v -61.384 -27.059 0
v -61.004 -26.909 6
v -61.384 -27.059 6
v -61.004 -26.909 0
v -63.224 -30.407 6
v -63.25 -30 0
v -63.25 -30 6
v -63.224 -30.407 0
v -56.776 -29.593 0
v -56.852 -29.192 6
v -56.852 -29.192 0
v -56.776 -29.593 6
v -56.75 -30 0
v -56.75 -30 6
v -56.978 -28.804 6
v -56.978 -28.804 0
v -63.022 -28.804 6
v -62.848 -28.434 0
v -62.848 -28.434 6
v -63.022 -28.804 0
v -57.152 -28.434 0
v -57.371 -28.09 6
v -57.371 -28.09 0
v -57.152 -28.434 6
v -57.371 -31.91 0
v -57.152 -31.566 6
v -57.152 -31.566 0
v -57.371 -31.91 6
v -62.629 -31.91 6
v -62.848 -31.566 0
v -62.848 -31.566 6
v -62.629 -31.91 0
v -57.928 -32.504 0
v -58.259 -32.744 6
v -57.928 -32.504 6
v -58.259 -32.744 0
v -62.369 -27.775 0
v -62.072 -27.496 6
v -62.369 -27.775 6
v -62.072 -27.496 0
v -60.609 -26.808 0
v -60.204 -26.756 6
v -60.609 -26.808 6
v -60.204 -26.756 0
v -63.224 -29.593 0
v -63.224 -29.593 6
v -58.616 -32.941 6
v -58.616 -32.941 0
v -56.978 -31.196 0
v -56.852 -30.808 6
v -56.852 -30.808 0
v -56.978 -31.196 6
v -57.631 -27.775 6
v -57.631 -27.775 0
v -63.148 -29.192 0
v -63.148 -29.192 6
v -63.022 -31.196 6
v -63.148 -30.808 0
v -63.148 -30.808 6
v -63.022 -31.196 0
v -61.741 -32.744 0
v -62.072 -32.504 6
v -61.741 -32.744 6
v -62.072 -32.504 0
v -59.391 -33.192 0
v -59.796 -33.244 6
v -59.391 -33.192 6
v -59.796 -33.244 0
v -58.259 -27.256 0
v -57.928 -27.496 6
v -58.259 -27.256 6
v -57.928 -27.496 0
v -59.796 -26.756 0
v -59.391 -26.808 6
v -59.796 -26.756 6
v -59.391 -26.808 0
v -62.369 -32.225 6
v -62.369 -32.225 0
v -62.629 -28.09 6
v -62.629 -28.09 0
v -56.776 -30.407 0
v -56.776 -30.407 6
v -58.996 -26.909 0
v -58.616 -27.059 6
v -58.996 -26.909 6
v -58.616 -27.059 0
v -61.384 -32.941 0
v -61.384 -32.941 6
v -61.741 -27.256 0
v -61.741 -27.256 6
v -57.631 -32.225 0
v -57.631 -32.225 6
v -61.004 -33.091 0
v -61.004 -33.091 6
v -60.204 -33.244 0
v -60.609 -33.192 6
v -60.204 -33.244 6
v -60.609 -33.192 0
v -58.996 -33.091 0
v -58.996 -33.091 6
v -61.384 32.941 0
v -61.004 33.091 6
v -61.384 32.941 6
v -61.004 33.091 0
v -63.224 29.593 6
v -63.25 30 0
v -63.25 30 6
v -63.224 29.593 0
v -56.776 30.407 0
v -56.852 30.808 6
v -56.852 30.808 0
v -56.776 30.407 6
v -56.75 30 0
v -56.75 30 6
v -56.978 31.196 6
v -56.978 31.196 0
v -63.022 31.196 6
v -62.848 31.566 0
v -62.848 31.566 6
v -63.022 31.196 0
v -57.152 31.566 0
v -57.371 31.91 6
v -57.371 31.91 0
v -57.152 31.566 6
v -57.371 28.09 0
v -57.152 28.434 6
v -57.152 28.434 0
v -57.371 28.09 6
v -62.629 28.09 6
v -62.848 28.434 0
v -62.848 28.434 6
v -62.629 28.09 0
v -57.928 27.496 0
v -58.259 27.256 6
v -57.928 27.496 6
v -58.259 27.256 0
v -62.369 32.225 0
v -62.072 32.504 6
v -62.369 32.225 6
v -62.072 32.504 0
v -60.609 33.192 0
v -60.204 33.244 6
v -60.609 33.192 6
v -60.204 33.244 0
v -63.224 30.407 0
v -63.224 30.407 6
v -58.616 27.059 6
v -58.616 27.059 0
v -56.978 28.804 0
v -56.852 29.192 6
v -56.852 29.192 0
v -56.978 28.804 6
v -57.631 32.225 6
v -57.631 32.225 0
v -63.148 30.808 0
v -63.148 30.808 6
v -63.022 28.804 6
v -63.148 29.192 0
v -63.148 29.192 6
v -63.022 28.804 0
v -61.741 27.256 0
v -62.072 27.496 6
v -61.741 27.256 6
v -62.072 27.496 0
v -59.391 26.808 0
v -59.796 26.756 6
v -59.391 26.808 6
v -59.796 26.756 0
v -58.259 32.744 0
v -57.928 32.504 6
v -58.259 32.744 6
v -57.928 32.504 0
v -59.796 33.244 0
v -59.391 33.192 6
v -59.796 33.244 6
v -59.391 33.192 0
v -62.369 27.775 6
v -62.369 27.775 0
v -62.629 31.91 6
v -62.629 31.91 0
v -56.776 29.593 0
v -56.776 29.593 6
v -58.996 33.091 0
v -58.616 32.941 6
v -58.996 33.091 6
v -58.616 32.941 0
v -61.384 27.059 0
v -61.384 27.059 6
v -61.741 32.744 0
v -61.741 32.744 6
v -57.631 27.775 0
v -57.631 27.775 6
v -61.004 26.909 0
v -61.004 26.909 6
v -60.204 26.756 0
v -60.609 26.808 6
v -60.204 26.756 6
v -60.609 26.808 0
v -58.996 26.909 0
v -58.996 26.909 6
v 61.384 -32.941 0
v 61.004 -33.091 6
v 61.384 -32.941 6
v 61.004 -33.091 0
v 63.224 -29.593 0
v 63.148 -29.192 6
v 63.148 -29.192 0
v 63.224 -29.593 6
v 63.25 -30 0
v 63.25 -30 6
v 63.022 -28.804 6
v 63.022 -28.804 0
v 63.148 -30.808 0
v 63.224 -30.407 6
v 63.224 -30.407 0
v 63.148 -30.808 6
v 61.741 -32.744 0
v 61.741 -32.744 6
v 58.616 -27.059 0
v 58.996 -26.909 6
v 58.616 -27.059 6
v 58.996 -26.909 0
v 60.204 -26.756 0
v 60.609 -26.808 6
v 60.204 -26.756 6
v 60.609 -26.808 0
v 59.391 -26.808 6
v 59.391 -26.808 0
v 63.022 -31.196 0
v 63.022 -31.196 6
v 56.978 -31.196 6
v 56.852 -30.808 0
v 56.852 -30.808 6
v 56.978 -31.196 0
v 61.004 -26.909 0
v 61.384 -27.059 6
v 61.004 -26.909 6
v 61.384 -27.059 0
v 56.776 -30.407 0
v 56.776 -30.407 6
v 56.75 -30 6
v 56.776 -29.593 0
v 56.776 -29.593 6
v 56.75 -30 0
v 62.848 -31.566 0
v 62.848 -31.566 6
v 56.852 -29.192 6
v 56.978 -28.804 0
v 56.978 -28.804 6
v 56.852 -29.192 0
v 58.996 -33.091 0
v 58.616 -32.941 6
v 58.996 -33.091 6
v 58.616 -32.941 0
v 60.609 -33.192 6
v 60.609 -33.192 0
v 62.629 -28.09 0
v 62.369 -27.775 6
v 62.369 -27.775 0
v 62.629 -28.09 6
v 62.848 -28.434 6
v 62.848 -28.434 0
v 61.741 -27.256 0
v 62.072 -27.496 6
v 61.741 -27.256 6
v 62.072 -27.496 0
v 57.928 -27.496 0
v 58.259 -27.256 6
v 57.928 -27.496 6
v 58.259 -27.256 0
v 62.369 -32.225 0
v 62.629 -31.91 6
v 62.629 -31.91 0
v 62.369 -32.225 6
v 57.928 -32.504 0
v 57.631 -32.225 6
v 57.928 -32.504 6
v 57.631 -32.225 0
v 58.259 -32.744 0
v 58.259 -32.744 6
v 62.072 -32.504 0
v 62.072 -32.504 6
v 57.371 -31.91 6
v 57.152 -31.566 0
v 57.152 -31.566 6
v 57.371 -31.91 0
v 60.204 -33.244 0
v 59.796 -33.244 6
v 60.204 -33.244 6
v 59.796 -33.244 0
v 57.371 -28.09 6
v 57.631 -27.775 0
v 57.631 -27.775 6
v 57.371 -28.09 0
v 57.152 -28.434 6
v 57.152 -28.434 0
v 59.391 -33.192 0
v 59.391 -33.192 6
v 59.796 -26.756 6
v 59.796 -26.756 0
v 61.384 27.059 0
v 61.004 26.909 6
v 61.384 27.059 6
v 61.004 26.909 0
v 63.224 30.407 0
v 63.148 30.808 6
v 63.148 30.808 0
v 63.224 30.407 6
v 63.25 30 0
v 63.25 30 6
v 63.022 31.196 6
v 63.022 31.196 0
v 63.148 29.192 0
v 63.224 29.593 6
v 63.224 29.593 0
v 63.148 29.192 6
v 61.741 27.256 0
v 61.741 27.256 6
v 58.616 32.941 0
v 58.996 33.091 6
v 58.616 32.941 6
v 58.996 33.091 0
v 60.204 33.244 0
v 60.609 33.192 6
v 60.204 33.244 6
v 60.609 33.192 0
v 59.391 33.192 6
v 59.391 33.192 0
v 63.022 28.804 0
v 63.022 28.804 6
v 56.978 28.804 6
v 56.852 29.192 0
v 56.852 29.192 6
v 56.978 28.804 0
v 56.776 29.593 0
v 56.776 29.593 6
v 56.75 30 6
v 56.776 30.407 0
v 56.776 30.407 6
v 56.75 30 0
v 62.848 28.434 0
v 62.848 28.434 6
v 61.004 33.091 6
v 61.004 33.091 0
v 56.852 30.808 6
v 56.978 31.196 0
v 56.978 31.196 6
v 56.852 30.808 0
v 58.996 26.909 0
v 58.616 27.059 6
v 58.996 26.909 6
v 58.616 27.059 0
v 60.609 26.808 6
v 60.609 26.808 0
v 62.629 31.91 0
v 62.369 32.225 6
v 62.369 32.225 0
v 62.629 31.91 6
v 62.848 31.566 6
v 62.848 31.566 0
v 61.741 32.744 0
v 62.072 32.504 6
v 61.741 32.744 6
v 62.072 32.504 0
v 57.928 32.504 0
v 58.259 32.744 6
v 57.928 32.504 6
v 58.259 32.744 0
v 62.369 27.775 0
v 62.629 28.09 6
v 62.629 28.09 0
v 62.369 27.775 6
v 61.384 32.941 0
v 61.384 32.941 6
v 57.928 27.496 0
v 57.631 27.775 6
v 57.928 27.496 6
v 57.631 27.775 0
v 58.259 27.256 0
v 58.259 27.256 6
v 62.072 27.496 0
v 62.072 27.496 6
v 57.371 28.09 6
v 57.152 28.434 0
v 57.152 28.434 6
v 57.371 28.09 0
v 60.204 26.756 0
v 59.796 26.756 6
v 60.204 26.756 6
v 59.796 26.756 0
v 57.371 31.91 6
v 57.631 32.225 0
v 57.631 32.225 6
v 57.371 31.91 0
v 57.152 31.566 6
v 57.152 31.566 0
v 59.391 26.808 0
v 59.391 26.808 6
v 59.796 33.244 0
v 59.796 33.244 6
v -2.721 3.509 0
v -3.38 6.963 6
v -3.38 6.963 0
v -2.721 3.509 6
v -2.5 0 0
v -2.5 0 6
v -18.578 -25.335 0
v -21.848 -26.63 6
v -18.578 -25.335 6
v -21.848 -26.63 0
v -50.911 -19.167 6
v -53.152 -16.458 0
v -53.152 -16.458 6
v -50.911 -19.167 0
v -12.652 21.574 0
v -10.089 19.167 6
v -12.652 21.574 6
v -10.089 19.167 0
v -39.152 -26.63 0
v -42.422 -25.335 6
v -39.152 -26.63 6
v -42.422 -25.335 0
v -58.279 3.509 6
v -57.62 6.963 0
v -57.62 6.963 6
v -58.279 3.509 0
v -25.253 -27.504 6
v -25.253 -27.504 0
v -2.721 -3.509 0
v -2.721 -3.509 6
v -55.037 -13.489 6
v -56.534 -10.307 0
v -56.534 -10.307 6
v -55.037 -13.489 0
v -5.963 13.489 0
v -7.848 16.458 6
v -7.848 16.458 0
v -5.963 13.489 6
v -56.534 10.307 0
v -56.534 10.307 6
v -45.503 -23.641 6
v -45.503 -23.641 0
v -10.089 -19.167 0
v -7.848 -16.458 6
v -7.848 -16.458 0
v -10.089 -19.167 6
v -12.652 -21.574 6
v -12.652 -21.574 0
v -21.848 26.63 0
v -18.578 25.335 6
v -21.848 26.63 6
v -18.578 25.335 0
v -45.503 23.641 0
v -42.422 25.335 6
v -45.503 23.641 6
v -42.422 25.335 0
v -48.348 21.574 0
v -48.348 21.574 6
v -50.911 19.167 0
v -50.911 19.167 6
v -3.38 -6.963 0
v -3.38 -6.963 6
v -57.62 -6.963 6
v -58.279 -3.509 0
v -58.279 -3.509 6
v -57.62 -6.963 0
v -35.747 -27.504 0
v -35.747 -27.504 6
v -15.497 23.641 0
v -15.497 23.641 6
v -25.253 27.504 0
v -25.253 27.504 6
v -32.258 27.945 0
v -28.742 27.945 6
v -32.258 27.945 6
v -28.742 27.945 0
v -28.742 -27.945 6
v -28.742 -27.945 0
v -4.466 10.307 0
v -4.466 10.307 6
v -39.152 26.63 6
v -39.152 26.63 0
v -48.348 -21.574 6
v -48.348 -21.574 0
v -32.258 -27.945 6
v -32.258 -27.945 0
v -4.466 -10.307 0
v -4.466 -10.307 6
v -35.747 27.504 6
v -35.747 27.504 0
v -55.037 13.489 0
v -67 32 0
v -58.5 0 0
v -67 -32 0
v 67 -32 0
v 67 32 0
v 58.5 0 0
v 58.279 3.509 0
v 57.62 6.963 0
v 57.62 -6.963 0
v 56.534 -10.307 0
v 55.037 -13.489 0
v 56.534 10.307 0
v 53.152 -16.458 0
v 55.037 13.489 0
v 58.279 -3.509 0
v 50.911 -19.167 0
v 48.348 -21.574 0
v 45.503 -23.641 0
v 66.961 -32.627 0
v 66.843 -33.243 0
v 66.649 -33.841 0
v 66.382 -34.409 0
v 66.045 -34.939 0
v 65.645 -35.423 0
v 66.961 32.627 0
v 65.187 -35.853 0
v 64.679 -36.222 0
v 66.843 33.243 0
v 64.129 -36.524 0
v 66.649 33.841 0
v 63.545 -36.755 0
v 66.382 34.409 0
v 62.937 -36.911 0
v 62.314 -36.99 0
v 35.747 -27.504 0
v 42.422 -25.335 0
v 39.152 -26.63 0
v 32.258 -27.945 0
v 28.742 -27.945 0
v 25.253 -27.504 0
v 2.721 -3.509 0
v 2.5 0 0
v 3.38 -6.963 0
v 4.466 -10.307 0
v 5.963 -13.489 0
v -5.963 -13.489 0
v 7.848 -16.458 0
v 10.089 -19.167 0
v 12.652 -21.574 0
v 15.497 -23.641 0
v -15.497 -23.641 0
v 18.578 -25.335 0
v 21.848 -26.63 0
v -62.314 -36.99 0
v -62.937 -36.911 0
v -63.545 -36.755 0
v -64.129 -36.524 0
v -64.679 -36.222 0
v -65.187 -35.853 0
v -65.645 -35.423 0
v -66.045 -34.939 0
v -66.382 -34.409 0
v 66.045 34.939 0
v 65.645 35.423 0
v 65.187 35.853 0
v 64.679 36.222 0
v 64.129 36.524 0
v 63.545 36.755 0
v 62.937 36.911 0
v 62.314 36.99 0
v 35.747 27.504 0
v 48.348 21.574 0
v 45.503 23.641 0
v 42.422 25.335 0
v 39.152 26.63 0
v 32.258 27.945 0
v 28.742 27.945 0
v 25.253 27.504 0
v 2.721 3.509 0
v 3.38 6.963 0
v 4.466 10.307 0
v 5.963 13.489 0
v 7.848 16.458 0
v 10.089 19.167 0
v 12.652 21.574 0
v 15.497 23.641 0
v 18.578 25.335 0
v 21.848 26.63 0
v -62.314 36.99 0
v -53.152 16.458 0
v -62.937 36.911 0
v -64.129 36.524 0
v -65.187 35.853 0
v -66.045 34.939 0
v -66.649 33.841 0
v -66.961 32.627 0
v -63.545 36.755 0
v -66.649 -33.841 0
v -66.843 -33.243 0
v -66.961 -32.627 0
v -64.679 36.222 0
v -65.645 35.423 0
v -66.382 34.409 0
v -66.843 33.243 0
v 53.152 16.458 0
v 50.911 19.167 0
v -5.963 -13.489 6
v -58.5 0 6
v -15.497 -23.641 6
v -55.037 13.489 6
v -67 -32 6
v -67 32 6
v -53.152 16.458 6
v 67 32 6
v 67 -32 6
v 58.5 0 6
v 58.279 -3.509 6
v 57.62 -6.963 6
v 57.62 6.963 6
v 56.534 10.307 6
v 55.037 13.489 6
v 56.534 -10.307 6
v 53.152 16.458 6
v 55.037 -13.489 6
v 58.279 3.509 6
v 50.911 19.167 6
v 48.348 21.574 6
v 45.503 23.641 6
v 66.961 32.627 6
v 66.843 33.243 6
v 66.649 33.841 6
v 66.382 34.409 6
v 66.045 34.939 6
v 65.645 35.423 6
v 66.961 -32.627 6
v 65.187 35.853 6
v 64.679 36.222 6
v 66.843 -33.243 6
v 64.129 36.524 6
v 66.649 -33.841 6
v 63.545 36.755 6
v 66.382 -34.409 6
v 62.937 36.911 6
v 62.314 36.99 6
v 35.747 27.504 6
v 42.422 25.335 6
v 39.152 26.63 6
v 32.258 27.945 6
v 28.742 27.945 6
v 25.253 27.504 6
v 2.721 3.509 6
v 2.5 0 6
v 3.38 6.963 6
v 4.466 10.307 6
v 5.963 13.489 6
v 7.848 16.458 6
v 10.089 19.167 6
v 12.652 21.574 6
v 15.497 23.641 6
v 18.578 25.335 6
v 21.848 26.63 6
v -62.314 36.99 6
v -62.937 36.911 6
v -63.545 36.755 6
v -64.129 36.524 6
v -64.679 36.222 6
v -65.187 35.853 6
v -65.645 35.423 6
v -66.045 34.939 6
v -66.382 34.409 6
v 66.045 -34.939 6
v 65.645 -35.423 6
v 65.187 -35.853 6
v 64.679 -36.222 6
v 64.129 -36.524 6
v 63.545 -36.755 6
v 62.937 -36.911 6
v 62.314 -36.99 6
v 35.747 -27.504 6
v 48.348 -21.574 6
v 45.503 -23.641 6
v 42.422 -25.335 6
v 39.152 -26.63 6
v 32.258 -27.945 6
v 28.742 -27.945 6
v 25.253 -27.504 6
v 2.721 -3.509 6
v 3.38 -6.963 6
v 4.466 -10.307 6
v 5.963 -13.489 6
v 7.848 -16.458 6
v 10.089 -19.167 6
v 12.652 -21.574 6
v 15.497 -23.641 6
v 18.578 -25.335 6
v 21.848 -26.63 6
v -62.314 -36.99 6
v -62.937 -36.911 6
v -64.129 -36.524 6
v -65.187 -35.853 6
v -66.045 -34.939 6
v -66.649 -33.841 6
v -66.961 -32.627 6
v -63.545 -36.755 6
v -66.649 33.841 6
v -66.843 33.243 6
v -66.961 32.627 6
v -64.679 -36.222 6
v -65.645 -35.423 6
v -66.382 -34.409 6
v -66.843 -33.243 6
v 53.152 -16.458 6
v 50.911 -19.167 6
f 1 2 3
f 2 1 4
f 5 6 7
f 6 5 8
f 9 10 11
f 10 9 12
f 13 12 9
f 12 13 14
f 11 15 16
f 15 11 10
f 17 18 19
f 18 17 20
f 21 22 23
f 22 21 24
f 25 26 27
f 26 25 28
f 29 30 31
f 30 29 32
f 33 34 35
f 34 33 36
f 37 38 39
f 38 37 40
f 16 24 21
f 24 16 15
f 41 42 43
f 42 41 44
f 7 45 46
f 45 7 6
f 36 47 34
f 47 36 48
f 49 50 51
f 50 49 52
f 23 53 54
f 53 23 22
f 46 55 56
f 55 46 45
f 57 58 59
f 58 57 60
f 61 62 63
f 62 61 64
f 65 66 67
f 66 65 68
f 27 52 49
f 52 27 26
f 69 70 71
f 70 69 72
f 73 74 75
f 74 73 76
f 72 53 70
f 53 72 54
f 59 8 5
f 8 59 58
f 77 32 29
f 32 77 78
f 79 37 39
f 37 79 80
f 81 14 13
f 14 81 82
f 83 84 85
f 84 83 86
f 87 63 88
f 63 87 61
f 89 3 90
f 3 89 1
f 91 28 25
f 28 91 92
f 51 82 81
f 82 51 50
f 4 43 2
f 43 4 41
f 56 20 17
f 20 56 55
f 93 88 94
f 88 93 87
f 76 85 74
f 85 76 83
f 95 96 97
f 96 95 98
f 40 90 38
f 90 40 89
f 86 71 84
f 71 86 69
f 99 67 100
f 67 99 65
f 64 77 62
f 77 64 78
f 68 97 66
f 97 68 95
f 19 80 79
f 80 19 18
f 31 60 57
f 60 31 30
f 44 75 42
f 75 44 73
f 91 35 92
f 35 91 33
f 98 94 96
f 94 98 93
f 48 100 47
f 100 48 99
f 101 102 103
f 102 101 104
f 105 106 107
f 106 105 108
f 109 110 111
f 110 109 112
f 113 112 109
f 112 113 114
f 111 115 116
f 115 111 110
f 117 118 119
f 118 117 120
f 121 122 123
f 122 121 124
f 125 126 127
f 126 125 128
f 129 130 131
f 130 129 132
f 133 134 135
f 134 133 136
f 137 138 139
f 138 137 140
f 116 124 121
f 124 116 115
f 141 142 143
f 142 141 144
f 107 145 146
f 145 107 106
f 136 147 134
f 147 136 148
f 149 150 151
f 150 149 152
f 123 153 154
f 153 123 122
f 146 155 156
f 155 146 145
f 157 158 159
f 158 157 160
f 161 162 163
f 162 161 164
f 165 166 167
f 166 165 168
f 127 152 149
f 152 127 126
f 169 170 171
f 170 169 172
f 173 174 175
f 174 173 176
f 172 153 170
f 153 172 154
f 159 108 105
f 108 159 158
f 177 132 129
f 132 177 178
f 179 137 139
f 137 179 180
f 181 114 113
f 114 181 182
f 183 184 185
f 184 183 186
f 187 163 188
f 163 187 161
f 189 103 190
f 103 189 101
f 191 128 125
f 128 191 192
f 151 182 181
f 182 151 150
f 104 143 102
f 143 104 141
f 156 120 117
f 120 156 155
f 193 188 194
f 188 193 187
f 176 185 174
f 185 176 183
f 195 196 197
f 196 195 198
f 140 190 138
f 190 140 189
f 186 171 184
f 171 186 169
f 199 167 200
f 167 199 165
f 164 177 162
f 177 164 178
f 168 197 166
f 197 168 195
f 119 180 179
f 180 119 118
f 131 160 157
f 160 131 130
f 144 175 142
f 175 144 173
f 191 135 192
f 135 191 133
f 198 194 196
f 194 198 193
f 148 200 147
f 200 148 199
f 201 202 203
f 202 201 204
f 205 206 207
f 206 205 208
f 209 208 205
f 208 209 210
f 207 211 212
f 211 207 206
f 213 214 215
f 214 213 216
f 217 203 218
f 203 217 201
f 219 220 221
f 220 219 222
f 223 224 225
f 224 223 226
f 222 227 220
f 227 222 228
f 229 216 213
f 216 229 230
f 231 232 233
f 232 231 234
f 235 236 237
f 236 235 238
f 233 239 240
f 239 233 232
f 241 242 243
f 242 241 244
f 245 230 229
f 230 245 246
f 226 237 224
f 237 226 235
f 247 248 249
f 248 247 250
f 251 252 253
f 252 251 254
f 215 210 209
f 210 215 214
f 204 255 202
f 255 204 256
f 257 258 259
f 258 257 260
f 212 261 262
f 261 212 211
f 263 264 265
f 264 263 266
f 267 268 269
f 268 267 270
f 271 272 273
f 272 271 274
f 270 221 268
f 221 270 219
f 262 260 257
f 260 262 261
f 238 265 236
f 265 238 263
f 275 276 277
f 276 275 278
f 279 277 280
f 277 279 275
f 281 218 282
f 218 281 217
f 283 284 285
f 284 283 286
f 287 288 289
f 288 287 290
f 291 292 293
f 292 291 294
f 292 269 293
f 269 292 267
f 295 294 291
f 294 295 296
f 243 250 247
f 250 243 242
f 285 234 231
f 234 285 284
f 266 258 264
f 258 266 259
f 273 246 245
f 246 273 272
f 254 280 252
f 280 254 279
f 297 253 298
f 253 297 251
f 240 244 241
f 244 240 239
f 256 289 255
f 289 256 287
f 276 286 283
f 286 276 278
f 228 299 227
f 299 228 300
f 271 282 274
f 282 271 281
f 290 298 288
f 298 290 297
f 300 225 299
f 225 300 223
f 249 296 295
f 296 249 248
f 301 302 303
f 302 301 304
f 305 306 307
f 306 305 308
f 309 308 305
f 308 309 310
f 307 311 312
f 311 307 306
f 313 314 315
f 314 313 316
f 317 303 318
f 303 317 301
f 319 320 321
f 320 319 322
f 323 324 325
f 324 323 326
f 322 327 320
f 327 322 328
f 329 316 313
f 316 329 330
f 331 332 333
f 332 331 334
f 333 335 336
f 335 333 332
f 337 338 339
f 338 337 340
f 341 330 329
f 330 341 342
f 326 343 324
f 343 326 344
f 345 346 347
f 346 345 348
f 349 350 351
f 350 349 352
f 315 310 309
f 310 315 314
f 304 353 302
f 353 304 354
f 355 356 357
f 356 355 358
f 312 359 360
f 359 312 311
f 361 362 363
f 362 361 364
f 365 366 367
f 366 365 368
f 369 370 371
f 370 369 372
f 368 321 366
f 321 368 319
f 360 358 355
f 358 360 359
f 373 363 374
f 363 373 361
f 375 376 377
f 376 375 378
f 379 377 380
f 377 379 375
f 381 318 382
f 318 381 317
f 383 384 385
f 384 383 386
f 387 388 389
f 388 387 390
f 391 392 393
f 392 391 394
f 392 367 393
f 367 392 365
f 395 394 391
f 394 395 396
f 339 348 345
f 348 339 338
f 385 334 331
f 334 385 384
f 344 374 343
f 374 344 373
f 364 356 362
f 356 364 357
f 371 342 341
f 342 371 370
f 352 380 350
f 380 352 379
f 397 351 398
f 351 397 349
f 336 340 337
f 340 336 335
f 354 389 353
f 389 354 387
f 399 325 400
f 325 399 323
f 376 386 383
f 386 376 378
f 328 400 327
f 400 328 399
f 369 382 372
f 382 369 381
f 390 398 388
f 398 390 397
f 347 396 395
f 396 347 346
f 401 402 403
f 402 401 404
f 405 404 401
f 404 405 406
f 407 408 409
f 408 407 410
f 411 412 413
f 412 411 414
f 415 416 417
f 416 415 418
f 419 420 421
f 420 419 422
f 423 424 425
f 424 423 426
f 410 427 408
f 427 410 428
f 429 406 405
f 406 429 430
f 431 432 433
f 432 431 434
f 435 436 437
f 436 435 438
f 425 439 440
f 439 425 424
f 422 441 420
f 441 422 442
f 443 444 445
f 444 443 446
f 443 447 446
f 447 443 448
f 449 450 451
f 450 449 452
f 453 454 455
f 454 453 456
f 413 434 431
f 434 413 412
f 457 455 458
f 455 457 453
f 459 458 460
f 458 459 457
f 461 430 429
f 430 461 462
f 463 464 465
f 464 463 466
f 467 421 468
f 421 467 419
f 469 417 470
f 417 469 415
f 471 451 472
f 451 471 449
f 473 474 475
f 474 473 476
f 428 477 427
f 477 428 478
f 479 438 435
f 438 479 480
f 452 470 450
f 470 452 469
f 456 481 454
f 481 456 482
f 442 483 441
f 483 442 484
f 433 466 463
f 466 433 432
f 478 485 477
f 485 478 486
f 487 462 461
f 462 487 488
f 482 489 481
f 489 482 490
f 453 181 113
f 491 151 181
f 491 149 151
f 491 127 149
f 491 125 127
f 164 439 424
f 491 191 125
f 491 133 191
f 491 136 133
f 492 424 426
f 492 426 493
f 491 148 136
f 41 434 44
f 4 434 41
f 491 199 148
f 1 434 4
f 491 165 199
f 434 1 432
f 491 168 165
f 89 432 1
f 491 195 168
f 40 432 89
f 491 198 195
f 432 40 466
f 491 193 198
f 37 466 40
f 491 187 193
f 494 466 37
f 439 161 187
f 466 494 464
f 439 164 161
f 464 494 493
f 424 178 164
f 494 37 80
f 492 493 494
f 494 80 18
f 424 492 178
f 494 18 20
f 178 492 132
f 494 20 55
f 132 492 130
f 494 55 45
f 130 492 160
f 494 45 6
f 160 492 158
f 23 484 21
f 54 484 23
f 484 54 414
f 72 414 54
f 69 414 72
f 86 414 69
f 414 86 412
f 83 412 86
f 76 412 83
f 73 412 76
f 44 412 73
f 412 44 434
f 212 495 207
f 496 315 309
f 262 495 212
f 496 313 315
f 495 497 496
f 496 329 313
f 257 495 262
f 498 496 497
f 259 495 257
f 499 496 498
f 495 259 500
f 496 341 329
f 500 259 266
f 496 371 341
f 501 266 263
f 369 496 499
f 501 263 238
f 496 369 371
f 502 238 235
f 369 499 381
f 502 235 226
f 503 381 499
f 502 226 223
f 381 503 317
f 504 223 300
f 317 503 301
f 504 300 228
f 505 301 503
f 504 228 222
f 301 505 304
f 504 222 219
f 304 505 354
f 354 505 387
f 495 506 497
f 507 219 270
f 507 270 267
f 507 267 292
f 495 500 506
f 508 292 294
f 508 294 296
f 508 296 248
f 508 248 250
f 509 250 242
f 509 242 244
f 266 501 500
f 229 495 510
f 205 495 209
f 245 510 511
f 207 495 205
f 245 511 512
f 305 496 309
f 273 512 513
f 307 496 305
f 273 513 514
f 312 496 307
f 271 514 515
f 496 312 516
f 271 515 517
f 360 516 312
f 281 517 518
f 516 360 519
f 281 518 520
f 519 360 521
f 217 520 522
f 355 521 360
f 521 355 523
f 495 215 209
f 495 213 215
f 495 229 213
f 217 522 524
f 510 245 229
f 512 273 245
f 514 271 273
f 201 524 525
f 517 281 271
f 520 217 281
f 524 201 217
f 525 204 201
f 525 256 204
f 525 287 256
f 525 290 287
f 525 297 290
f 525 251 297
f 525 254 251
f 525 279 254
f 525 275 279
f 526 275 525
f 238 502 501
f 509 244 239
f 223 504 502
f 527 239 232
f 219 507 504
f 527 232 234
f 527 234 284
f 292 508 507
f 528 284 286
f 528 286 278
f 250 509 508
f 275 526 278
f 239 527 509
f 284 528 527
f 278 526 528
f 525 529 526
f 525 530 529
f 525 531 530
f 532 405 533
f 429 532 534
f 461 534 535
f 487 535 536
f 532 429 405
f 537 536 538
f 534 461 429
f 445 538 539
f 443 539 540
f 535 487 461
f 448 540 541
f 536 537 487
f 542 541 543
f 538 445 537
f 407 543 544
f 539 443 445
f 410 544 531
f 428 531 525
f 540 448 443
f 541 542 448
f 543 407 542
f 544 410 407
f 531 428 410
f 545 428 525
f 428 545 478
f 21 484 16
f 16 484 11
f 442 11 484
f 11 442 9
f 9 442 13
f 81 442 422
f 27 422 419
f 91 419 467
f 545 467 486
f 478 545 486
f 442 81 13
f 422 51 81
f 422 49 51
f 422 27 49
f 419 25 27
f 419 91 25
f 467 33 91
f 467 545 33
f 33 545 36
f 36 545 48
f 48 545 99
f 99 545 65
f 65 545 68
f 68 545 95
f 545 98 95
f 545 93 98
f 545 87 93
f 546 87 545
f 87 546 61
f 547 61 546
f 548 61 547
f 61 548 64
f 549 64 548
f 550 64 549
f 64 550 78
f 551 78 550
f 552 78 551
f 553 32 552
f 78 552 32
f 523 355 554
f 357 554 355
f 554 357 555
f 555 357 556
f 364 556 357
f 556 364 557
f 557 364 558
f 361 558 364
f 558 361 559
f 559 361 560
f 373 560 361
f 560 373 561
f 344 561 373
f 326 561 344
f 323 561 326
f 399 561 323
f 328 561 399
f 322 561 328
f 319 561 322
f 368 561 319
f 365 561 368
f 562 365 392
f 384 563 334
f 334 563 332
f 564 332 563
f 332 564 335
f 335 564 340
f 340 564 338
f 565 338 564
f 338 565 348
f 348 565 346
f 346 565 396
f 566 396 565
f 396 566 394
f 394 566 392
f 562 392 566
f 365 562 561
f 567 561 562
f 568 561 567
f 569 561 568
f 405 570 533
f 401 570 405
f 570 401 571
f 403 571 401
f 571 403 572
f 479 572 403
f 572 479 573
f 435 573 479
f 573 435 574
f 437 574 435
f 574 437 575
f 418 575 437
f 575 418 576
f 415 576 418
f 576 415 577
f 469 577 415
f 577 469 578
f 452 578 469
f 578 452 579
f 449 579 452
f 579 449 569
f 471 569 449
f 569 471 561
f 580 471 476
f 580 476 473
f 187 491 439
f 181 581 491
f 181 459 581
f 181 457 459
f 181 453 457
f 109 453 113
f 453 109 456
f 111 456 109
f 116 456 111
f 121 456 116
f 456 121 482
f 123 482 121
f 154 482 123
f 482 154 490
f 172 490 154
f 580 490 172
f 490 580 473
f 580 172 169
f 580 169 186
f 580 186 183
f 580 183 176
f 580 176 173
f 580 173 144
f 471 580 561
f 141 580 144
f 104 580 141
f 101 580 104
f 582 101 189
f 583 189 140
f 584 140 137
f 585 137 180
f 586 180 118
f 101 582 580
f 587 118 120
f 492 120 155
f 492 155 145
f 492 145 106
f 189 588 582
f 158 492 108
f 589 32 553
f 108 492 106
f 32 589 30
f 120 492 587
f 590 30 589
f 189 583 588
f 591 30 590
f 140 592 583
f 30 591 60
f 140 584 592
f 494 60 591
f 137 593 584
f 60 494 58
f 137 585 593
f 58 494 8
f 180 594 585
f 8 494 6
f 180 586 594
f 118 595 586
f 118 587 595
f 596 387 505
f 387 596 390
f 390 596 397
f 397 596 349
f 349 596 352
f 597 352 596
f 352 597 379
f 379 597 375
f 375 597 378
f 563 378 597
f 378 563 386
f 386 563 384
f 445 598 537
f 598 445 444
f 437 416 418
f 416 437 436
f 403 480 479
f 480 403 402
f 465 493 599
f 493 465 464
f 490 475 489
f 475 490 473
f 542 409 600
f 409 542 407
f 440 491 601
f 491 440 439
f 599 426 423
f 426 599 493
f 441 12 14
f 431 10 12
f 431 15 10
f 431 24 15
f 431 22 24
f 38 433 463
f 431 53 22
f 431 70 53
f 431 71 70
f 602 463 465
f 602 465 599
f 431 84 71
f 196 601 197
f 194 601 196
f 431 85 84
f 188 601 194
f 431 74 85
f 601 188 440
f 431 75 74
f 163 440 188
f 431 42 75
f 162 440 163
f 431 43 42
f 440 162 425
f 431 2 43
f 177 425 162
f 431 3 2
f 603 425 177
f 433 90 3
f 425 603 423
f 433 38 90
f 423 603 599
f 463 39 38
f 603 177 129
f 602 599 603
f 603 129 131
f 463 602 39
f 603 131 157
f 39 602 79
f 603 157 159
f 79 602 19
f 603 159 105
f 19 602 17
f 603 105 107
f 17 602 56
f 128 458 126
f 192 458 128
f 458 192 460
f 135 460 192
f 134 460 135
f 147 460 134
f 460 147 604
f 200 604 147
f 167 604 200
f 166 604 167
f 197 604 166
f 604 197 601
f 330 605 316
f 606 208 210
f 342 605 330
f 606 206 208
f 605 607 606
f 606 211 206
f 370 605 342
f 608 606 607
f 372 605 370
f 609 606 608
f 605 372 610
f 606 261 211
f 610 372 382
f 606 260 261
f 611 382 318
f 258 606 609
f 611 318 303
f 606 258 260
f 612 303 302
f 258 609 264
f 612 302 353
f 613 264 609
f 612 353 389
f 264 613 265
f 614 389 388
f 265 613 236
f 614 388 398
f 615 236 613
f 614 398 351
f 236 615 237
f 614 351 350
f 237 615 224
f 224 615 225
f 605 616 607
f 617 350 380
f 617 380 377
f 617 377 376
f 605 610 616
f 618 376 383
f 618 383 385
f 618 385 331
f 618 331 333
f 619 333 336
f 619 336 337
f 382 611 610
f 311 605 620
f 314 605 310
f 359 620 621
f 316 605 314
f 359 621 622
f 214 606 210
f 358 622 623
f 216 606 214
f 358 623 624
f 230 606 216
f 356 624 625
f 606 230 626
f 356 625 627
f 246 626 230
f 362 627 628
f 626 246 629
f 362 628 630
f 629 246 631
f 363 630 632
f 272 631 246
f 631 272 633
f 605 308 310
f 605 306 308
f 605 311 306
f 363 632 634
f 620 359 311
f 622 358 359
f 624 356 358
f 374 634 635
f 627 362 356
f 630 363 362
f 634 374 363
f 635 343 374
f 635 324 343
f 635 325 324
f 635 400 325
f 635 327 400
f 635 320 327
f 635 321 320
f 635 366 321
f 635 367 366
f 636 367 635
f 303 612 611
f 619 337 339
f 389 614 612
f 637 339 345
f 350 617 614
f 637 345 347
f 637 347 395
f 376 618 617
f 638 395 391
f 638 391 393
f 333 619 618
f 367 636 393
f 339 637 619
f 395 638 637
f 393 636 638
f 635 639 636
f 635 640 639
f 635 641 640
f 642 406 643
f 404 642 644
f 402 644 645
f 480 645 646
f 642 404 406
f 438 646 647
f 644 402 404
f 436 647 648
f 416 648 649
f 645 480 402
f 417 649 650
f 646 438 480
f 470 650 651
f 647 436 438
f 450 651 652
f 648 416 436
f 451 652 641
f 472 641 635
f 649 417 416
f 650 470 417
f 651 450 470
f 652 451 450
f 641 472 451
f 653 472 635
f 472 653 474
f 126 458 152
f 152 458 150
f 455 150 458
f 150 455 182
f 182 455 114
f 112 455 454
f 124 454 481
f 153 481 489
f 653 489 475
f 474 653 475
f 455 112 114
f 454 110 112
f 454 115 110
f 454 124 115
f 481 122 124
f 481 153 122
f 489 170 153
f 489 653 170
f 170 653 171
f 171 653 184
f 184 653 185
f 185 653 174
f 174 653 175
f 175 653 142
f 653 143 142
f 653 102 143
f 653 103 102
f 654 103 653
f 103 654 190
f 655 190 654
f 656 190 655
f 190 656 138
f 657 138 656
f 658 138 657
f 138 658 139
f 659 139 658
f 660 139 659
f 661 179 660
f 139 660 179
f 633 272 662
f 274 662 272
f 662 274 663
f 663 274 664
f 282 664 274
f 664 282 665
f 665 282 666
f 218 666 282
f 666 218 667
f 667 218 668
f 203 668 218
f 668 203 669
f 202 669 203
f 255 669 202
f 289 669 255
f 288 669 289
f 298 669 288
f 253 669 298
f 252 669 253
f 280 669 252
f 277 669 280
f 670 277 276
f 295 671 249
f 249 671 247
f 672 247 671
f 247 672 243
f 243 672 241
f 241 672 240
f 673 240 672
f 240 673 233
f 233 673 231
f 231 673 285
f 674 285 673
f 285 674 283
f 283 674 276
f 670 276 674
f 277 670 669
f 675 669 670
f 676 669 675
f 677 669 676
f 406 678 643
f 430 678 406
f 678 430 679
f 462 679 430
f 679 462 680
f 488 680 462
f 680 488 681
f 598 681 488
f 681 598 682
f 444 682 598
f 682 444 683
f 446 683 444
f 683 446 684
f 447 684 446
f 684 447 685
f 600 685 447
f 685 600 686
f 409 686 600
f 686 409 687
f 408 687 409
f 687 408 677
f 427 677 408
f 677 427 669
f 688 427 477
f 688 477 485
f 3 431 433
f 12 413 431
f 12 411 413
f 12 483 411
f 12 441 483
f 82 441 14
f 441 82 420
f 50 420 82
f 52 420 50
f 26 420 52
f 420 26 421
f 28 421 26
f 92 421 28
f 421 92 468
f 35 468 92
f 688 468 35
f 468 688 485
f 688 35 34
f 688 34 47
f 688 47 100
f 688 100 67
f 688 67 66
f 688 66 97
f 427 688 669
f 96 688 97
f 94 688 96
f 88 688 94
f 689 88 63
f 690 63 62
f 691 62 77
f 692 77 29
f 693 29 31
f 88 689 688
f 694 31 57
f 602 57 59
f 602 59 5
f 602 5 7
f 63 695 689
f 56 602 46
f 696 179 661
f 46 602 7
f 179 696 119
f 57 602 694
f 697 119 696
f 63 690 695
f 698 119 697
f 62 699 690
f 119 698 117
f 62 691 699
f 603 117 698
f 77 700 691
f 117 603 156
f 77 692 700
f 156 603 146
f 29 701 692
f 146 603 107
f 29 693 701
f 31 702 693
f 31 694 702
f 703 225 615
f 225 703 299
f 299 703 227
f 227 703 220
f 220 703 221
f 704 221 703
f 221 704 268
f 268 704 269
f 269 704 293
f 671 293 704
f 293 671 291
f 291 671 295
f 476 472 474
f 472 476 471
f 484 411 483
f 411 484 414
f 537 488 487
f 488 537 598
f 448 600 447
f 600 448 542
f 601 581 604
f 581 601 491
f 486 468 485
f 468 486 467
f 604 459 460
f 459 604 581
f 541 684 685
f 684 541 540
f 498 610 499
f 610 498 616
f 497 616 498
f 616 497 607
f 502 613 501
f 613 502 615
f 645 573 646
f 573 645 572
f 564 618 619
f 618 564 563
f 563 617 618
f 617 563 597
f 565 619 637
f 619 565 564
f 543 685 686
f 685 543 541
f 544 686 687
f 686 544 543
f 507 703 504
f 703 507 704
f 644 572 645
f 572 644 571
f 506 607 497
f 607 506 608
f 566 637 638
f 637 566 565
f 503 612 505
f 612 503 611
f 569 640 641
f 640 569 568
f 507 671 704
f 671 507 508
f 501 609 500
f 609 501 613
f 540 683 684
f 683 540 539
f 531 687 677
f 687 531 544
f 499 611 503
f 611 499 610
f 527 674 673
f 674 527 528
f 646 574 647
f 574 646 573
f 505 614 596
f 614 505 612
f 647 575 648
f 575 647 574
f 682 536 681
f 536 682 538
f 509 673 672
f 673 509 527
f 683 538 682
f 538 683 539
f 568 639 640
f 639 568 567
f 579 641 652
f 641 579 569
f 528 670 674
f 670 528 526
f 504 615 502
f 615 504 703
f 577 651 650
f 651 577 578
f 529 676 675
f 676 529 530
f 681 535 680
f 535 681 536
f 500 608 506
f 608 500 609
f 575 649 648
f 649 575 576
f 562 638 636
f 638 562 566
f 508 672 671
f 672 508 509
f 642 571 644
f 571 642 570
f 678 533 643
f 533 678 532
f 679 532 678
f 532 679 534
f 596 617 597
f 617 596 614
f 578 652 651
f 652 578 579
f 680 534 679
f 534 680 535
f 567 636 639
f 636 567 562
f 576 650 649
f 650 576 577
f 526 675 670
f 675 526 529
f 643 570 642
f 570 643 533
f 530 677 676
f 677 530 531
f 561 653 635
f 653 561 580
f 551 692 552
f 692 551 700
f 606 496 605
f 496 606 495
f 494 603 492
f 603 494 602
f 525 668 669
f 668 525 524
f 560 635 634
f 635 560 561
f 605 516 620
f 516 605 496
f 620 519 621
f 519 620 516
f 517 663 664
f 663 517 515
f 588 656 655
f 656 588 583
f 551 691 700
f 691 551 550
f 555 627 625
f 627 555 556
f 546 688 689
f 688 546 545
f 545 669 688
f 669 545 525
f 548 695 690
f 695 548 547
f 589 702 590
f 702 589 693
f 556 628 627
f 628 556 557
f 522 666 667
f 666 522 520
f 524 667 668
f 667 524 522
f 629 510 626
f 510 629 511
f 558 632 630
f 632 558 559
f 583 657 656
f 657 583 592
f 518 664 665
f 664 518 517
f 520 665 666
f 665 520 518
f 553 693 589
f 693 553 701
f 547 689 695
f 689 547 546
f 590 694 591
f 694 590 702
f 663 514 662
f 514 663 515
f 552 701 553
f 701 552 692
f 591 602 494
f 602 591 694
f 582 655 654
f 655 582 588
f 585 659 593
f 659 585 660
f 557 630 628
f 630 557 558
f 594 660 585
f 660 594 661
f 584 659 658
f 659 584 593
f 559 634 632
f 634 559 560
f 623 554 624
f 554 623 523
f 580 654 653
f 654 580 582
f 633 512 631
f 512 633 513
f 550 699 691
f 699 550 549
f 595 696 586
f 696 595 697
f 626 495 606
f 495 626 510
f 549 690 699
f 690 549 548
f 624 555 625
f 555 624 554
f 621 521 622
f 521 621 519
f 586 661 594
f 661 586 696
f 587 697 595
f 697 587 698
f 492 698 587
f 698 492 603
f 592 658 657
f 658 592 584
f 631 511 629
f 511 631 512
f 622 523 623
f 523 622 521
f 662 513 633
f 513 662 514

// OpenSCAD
$fn = 50;


difference() {
	union() {
		hull() {
			translate(v = [-62.0000000000, 32.0000000000, 0]) {
				cylinder(h = 6, r = 5);
			}
			translate(v = [62.0000000000, 32.0000000000, 0]) {
				cylinder(h = 6, r = 5);
			}
			translate(v = [-62.0000000000, -32.0000000000, 0]) {
				cylinder(h = 6, r = 5);
			}
			translate(v = [62.0000000000, -32.0000000000, 0]) {
				cylinder(h = 6, r = 5);
			}
		}
	}
	union() {
		#translate(v = [-60.0000000000, -30.0000000000, -100.0000000000]) {
			cylinder(h = 200, r = 3.2500000000);
		}
		#translate(v = [-60.0000000000, 30.0000000000, -100.0000000000]) {
			cylinder(h = 200, r = 3.2500000000);
		}
		#translate(v = [60.0000000000, -30.0000000000, -100.0000000000]) {
			cylinder(h = 200, r = 3.2500000000);
		}
		#translate(v = [60.0000000000, 30.0000000000, -100.0000000000]) {
			cylinder(h = 200, r = 3.2500000000);
		}
		#translate(v = [-30.5000000000, 0, 0]) {
			cylinder(h = 6, r = 28.0000000000);
		}
		#translate(v = [30.5000000000, 0, 0]) {
			cylinder(h = 6, r = 28.0000000000);
		}
	}
}
